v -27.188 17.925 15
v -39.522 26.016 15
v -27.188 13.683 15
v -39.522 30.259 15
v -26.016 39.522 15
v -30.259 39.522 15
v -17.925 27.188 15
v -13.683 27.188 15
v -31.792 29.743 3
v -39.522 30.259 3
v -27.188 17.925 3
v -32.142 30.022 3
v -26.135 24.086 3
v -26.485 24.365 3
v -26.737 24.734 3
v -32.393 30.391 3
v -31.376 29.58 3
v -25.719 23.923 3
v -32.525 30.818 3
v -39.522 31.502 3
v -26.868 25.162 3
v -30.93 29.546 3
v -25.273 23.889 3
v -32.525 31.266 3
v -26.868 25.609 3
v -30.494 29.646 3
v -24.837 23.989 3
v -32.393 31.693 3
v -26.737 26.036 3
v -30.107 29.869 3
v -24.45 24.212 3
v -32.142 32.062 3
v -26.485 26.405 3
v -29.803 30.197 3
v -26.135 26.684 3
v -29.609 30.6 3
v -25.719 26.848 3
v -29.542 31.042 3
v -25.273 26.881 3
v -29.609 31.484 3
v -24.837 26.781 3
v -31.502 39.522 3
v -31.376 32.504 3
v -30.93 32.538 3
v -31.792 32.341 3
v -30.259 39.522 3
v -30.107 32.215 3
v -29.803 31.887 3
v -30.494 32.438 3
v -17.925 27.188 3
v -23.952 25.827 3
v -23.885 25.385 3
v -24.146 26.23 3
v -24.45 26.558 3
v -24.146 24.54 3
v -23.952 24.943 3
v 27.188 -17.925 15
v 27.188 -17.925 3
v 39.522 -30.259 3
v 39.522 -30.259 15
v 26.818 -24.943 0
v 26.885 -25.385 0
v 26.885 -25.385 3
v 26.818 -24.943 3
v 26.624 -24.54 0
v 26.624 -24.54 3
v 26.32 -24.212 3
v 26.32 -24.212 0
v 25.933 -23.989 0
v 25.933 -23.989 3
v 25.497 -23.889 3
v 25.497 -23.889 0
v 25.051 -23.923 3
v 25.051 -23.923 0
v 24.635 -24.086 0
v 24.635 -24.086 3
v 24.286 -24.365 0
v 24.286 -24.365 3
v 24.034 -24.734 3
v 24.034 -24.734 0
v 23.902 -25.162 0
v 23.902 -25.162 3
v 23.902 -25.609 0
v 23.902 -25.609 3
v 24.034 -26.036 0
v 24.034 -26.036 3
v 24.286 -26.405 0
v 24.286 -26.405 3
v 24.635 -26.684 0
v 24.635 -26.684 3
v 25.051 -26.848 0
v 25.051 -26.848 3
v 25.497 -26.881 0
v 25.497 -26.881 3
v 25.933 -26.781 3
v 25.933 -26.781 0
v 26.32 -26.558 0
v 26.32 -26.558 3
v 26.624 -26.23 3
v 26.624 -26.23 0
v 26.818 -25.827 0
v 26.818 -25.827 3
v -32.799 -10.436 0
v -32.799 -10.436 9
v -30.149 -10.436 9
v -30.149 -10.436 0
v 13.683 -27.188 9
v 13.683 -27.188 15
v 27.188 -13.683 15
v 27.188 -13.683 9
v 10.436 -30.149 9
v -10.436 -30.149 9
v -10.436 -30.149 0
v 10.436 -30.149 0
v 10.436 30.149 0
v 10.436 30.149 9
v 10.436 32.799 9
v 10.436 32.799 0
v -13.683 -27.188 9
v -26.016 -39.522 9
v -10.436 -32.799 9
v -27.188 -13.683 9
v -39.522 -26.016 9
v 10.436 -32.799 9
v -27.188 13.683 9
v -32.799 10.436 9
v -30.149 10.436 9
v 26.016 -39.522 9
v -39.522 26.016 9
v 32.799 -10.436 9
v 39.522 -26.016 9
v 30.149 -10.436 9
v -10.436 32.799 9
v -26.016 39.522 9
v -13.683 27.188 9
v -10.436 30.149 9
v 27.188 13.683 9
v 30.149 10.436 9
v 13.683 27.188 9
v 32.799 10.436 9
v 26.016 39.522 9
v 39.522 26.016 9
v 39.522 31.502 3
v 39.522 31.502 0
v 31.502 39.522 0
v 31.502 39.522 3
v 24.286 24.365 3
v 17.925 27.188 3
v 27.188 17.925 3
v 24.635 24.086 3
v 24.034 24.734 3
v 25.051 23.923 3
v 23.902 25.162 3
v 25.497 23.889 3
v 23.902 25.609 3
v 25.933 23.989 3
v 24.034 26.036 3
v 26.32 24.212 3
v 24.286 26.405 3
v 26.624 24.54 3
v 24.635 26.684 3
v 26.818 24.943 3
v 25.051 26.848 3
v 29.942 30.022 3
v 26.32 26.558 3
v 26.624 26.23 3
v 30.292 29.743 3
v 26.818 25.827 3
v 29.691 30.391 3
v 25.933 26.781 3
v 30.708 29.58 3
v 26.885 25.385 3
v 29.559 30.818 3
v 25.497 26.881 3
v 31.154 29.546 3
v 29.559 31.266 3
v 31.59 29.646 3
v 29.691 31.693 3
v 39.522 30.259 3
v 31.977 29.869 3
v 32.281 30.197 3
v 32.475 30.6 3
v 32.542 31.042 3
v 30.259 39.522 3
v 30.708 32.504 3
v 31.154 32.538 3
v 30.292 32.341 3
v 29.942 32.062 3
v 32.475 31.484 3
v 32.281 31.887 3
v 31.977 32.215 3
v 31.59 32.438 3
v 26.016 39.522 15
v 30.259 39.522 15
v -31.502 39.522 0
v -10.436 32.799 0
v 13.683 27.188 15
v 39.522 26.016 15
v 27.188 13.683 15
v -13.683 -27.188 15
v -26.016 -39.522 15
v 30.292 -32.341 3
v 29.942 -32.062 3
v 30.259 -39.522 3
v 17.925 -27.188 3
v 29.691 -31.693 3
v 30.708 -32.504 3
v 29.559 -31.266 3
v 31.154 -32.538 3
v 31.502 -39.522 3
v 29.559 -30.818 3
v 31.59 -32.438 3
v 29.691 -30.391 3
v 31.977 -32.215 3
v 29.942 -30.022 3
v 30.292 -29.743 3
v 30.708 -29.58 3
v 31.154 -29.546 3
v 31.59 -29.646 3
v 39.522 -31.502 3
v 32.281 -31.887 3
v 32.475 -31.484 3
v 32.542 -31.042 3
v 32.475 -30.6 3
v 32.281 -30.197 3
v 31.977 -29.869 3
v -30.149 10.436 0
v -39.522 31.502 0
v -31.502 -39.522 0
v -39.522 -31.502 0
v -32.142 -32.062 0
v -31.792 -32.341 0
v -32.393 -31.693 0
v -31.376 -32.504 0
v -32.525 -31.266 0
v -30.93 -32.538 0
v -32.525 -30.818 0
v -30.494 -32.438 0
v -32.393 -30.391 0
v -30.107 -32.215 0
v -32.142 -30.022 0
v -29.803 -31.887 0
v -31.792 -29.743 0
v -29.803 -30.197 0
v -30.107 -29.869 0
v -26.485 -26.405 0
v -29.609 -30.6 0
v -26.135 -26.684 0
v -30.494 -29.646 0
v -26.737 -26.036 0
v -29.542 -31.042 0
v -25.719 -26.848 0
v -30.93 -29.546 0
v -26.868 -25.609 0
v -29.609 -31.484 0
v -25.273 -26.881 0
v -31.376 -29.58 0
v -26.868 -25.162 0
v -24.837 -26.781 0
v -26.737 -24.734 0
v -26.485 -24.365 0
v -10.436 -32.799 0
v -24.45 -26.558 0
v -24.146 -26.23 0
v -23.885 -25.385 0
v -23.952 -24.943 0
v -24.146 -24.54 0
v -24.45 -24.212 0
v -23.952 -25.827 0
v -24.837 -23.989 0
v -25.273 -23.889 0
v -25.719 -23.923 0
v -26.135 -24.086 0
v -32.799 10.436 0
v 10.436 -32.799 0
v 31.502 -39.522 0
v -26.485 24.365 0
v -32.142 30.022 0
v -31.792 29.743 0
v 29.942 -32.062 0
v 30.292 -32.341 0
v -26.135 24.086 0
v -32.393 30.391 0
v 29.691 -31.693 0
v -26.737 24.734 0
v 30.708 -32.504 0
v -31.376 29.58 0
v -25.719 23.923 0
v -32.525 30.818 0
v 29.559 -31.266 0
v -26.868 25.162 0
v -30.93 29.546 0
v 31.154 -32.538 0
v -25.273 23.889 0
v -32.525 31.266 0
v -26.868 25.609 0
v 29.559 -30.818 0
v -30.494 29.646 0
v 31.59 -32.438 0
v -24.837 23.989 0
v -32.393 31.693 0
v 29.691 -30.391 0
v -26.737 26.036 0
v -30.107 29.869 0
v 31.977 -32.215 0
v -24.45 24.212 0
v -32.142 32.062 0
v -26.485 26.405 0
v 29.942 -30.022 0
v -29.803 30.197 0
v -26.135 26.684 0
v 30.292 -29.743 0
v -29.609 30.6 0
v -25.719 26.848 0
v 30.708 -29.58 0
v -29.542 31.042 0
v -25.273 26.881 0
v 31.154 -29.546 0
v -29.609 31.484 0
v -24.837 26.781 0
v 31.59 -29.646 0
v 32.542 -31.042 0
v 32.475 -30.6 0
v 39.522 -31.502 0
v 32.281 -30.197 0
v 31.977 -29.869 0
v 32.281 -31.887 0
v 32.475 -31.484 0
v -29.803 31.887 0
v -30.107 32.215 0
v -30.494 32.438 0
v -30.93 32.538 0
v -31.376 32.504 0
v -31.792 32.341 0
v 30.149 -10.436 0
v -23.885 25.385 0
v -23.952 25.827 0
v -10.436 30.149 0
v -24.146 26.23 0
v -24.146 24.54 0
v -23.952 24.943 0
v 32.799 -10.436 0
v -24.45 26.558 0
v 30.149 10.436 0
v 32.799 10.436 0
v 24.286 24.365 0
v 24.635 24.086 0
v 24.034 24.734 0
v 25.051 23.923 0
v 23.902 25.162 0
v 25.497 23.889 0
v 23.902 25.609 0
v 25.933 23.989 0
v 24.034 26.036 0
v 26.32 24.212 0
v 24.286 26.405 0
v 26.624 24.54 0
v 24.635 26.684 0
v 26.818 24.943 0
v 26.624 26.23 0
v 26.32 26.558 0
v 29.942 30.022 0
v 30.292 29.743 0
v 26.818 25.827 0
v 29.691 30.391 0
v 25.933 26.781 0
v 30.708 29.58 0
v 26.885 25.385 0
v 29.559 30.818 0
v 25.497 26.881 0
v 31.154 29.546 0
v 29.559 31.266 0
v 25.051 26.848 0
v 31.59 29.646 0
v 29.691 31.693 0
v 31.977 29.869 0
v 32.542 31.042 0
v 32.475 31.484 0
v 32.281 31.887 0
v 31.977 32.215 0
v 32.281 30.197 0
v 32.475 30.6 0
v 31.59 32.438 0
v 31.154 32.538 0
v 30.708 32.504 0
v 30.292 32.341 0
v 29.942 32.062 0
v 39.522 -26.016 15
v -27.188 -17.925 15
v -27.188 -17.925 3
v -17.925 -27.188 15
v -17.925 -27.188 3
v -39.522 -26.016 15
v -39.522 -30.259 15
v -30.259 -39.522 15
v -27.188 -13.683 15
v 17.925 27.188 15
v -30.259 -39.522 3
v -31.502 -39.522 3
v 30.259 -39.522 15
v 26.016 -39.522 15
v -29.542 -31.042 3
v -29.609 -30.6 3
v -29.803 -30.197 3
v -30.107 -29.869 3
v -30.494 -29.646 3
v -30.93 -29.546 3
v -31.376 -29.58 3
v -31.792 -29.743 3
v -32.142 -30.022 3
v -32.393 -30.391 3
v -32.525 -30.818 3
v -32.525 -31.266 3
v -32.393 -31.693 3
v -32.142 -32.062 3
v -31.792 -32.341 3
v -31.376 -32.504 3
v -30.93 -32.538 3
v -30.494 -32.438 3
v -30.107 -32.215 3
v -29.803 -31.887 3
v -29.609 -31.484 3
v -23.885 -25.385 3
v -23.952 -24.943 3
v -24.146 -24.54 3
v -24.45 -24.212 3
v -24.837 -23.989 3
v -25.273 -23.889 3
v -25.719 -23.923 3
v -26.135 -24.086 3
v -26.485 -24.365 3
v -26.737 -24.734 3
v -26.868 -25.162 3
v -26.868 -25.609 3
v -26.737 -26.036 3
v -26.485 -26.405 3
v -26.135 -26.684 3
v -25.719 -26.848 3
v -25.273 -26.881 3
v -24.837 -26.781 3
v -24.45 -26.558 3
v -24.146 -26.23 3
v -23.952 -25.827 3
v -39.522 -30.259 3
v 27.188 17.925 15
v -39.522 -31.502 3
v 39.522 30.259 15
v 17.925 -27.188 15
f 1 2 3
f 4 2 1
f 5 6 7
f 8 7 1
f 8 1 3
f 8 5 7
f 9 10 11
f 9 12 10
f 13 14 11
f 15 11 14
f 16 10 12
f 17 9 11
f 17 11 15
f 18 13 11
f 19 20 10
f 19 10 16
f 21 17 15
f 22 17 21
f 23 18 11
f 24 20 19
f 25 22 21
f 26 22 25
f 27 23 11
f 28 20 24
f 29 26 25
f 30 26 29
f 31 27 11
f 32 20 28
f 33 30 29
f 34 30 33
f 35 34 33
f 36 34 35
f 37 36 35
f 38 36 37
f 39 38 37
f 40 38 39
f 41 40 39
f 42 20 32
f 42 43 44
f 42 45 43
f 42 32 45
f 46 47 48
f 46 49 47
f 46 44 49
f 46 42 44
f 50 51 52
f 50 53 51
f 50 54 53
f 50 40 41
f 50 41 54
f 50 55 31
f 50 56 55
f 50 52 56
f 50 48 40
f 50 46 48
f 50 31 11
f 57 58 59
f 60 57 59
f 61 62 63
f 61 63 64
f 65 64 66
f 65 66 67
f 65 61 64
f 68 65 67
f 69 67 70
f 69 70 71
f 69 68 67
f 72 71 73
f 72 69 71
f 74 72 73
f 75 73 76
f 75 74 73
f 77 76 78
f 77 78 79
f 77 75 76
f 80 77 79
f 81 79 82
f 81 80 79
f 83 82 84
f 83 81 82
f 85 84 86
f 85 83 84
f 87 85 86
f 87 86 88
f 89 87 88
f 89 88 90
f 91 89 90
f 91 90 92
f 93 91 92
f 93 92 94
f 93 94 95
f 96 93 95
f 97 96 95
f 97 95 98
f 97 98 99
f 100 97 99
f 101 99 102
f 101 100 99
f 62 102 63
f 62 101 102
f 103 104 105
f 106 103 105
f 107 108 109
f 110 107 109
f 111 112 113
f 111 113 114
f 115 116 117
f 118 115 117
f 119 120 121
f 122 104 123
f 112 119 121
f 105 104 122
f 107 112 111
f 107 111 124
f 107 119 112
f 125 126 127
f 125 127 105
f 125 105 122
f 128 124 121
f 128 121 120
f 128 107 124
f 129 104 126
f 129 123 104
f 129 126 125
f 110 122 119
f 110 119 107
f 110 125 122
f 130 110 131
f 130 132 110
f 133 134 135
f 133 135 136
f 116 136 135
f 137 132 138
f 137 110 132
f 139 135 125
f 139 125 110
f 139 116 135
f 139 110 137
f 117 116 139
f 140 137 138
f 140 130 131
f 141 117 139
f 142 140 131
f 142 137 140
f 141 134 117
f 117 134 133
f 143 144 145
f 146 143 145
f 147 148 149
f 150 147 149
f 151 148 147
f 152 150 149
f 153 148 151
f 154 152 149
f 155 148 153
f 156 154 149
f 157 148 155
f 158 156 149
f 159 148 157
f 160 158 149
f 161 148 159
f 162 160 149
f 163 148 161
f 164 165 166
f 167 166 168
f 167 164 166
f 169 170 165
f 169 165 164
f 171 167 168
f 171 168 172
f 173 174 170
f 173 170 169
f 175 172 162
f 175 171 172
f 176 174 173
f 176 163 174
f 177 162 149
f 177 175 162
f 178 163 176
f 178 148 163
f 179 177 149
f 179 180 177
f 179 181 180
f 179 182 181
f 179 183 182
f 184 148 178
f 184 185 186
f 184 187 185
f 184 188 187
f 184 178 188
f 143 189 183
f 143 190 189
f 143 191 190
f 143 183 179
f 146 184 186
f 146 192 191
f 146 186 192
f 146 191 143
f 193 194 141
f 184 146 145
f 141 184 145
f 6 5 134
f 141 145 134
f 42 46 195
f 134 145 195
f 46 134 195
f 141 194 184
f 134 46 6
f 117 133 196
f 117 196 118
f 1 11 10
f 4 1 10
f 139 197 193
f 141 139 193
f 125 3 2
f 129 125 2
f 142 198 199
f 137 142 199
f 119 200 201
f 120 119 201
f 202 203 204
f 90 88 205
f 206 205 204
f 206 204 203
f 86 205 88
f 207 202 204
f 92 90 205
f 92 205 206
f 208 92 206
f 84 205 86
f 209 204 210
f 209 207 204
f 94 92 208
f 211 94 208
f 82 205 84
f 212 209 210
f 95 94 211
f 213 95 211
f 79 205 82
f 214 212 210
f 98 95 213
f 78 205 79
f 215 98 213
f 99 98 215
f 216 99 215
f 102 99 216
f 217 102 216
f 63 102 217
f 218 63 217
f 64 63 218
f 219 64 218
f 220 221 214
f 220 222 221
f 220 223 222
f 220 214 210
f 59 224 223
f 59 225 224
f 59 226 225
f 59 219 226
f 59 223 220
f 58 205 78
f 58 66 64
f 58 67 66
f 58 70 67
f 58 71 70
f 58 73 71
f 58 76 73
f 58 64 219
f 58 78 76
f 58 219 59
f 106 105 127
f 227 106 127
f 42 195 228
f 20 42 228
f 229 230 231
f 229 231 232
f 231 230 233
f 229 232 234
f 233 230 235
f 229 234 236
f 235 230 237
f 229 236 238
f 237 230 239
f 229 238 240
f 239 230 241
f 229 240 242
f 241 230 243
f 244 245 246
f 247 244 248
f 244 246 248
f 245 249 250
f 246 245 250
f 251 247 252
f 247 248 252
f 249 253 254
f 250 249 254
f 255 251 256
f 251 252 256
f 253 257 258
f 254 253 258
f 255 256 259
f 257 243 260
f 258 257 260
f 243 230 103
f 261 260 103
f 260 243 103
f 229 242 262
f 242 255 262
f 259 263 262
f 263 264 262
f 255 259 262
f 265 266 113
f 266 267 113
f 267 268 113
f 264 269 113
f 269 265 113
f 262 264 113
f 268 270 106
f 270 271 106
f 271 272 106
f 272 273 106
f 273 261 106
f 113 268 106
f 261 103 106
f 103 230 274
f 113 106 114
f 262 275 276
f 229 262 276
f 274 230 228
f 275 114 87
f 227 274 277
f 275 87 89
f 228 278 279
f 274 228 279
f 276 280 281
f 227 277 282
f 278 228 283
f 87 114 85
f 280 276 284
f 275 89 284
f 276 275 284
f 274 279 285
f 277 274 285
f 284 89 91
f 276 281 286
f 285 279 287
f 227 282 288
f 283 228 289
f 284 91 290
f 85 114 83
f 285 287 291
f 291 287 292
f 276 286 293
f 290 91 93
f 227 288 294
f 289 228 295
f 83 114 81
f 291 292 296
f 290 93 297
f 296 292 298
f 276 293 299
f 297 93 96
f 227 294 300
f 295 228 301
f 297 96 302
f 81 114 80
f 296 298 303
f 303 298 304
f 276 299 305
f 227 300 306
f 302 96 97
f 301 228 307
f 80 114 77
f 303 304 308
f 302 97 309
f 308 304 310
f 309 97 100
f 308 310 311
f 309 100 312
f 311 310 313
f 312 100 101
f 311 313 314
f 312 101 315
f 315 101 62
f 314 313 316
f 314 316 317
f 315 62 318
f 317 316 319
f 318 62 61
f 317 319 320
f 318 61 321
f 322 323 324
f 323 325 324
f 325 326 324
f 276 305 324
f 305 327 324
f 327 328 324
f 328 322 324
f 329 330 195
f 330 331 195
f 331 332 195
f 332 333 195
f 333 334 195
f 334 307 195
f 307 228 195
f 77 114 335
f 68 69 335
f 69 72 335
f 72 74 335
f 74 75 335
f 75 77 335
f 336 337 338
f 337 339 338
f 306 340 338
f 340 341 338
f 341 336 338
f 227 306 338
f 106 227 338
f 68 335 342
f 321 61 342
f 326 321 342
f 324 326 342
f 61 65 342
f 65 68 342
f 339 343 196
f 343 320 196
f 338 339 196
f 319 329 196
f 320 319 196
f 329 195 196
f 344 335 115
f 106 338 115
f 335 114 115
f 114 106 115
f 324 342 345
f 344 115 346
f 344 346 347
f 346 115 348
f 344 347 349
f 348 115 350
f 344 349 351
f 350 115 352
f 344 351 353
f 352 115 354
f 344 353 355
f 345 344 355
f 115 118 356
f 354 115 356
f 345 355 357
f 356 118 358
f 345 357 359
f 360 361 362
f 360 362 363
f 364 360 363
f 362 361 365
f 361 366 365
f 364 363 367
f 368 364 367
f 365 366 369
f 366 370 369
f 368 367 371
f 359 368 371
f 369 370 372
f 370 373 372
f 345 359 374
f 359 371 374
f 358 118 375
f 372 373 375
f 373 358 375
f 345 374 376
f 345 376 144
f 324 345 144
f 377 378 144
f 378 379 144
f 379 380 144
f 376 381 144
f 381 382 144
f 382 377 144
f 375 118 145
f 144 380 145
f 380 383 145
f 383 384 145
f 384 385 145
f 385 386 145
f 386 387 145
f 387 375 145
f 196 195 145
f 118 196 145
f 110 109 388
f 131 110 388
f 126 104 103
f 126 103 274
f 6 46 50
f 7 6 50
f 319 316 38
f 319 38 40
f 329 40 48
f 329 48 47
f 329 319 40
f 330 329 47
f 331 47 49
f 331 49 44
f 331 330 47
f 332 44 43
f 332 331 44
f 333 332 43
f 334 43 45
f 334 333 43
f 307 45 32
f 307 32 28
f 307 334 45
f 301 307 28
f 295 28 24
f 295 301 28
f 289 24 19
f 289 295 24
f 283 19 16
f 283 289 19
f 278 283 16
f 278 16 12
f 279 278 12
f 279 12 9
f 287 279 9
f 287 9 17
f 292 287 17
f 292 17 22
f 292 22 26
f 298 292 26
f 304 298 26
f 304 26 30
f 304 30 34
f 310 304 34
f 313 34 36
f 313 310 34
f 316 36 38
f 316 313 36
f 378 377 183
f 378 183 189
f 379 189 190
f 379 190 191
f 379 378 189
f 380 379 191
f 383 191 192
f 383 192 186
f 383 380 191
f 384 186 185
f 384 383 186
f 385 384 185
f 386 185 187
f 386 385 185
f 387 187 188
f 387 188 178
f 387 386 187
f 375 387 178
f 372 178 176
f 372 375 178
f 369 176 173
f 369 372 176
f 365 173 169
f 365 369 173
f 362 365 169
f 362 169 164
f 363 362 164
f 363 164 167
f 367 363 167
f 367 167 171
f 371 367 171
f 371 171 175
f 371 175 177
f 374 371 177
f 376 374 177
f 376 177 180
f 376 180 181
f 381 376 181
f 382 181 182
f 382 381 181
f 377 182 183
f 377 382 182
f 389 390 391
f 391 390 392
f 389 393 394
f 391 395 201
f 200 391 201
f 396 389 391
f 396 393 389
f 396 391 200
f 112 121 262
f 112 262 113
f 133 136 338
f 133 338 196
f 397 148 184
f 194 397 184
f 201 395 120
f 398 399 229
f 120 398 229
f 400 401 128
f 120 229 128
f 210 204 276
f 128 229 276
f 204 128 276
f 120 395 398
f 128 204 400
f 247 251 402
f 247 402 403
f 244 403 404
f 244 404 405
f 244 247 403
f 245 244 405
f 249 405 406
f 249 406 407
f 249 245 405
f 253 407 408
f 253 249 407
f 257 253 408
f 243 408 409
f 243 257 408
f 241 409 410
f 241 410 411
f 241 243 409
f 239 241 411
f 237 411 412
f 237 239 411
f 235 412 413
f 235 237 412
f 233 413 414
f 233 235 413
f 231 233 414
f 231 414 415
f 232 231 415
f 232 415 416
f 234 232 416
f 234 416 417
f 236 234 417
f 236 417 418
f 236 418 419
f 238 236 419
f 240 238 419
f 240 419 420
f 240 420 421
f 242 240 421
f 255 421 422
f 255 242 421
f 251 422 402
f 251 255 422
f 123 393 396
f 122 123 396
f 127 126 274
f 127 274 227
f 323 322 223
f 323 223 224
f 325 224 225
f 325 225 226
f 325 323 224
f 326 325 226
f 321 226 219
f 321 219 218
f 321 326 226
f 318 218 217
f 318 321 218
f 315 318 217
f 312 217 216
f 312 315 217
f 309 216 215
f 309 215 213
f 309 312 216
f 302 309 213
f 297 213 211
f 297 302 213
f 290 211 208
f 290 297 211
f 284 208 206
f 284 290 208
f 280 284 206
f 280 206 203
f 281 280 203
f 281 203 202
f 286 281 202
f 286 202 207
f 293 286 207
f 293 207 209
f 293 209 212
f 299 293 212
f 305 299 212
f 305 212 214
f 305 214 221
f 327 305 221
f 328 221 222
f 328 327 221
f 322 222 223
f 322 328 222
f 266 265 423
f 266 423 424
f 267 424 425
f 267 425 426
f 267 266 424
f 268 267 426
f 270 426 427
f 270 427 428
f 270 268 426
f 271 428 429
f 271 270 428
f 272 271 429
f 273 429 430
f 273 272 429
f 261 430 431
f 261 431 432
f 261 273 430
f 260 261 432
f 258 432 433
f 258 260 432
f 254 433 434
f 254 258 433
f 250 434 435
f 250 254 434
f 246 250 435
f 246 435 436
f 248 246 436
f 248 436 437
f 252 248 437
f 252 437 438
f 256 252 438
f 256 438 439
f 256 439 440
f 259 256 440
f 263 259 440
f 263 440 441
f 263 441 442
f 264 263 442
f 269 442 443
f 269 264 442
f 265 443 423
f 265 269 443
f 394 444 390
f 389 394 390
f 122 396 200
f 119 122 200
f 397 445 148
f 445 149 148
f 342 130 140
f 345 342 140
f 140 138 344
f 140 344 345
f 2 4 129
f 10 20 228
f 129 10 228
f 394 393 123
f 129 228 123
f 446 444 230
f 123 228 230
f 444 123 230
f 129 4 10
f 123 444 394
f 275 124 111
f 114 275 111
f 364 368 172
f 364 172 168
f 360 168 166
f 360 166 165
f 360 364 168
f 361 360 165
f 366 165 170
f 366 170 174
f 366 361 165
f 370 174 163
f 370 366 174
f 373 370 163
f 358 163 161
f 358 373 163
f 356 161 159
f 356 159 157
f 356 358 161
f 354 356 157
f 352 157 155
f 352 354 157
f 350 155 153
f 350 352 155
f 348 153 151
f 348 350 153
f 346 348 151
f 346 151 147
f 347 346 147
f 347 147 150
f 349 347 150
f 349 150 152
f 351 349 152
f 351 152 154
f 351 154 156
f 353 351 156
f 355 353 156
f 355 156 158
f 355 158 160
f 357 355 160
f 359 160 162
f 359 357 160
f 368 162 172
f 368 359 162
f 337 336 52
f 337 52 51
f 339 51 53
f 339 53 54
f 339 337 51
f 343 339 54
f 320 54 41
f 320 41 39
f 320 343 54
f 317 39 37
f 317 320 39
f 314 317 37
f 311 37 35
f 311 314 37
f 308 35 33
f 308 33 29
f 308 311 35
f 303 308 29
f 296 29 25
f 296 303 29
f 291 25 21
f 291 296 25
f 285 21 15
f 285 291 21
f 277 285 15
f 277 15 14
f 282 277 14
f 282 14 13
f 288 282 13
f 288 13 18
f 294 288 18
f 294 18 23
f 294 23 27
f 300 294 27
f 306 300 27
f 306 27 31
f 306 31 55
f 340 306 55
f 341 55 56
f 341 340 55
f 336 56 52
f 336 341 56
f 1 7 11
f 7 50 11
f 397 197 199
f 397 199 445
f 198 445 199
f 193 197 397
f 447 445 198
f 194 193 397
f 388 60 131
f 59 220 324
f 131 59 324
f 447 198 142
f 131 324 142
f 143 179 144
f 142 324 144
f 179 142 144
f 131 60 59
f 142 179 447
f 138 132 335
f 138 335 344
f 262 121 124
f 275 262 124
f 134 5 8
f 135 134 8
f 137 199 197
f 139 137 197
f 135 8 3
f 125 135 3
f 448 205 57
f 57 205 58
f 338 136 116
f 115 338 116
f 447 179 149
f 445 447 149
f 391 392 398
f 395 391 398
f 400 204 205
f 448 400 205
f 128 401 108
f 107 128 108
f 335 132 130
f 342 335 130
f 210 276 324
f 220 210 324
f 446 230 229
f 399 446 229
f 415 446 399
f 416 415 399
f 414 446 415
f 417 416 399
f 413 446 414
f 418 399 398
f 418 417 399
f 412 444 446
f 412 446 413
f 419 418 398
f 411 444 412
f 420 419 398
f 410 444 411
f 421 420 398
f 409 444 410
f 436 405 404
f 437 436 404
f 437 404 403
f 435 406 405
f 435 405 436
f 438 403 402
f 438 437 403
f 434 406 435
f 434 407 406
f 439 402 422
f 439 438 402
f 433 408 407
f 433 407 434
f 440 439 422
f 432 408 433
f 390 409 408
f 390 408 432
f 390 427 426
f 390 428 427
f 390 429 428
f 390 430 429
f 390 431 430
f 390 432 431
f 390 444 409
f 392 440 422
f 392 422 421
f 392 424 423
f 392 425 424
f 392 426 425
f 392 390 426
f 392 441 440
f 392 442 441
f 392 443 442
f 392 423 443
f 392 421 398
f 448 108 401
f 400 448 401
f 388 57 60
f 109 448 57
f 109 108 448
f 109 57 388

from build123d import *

# Parameters (mm, degrees)
F1_DEPTH = 12
F0_R     = 1.5
F2_DEPTH = 3
F4_DEPTH = 6
F5_W     = 20.872174
F5_H     = 2.650432
F5_W_2   = 2.650432
F5_H_2   = 20.872174
F6_DEPTH = 9.001


with BuildPart() as f1:
    # F0 (on Top) → F1 (new body)
    with BuildSketch(Plane.XY):
        Polygon((36.522065, 27.258966), (27.188256, 17.925157), (17.925157, 27.188256), (27.258966, 36.522065), (30.258966, 39.522065), (27.258966, 39.522065), (0, 39.522065), (-27.258966, 39.522065), (-30.258966, 39.522065), (-27.258966, 36.522065), (-17.925157, 27.188256), (-27.188256, 17.925157), (-36.522065, 27.258966), (-39.522065, 30.258966), (-39.522065, 27.258966), (-39.522065, 0), (-39.522065, -27.258966), (-39.522065, -30.258966), (-36.522065, -27.258966), (-27.188256, -17.925157), (-17.925157, -27.188256), (-27.258966, -36.522065), (-30.258966, -39.522065), (-27.258966, -39.522065), (0, -39.522065), (27.258966, -39.522065), (30.258966, -39.522065), (27.258966, -36.522065), (17.925157, -27.188256), (27.188256, -17.925157), (36.522065, -27.258966), (39.522065, -30.258966), (39.522065, -27.258966), (39.522065, 0), (39.522065, 27.258966), (39.522065, 30.258966), align=None)
    extrude(amount=F1_DEPTH)

    # F0 (on Top) + F1_face (on face) → F2 (join)
    with BuildSketch(Plane.XY):
        Polygon((-31.501607, -39.522065), (-30.258966, -39.522065), (-27.258966, -36.522065), (-17.925157, -27.188256), (-27.188256, -17.925157), (-36.522065, -27.258966), (-39.522065, -30.258966), (-39.522065, -31.501607), align=None)
        with Locations((-31.041988, -31.041988)):
            Circle(F0_R, mode=Mode.SUBTRACT)
        with Locations((-25.385133, -25.385133)):
            Circle(F0_R, mode=Mode.SUBTRACT)
        Polygon((-27.258966, 36.522065), (-30.258966, 39.522065), (-31.501607, 39.522065), (-39.522065, 31.501607), (-39.522065, 30.258966), (-36.522065, 27.258966), (-27.188256, 17.925157), (-17.925157, 27.188256), align=None)
        with Locations((-25.385133, 25.385133)):
            Circle(F0_R, mode=Mode.SUBTRACT)
        with Locations((-31.041988, 31.041988)):
            Circle(F0_R, mode=Mode.SUBTRACT)
        Polygon((17.925157, 27.188256), (27.188256, 17.925157), (36.522065, 27.258966), (39.522065, 30.258966), (39.522065, 31.501607), (31.501607, 39.522065), (30.258966, 39.522065), (27.258966, 36.522065), align=None)
        with Locations((25.385133, 25.385133)):
            Circle(F0_R, mode=Mode.SUBTRACT)
        with Locations((31.041988, 31.041988)):
            Circle(F0_R, mode=Mode.SUBTRACT)
        Polygon((39.522065, -31.501607), (39.522065, -30.258966), (36.522065, -27.258966), (27.188256, -17.925157), (17.925157, -27.188256), (27.258966, -36.522065), (30.258966, -39.522065), (31.501607, -39.522065), align=None)
        with Locations((31.041988, -31.041988)):
            Circle(F0_R, mode=Mode.SUBTRACT)
        with Locations((25.385133, -25.385133)):
            Circle(F0_R, mode=Mode.SUBTRACT)
    with BuildSketch(Plane.XY.offset(12)):
        Polygon((27.188256, -17.925157), (39.522065, -30.258966), (39.522065, 30.258966), (27.188256, 17.925157), (17.925157, 27.188256), (30.258966, 39.522065), (-30.258966, 39.522065), (-17.925157, 27.188256), (-27.188256, 17.925157), (-39.522065, 30.258966), (-39.522065, -30.258966), (-27.188256, -17.925157), (-17.925157, -27.188256), (-30.258966, -39.522065), (30.258966, -39.522065), (17.925157, -27.188256), align=None)
    extrude(amount=F2_DEPTH)

    # F3 (on face) → F4 (cut)
    with BuildSketch(Plane.XY.offset(15)):
        Polygon((-26.016326, 39.522065), (-13.682516, 27.188256), (13.682516, 27.188256), (26.016326, 39.522065), align=None)
        Polygon((13.682516, 27.188256), (-13.682516, 27.188256), (-27.188256, 13.682516), (-27.188256, 0), (-27.188256, -13.682516), (-13.682516, -27.188256), (13.682516, -27.188256), (27.188256, -13.682516), (27.188256, 0), (27.188256, 13.682516), align=None)
        Polygon((-27.188256, 0), (-27.188256, 13.682516), (-39.522065, 26.016326), (-39.522065, 0), (-39.522065, -26.016326), (-27.188256, -13.682516), align=None)
        Polygon((39.522065, 26.016326), (27.188256, 13.682516), (27.188256, 0), (27.188256, -13.682516), (39.522065, -26.016326), (39.522065, 0), align=None)
        Polygon((13.682516, -27.188256), (-13.682516, -27.188256), (-26.016326, -39.522065), (26.016326, -39.522065), align=None)
    extrude(amount=-F4_DEPTH, mode=Mode.SUBTRACT)

    # F5 (on face) → F6 (cut, through all)
    with BuildSketch(Plane.XY.offset(9)):
        with Locations((0, 31.473912)):
            Rectangle(F5_W, F5_H)
        with Locations((-31.473912, 0)):
            Rectangle(F5_W_2, F5_H_2)
        with Locations((0, -31.473912)):
            Rectangle(F5_W, F5_H)
        with Locations((31.473912, 0)):
            Rectangle(F5_W_2, F5_H_2)
    extrude(amount=-F6_DEPTH, mode=Mode.SUBTRACT)


solid = f1.part
